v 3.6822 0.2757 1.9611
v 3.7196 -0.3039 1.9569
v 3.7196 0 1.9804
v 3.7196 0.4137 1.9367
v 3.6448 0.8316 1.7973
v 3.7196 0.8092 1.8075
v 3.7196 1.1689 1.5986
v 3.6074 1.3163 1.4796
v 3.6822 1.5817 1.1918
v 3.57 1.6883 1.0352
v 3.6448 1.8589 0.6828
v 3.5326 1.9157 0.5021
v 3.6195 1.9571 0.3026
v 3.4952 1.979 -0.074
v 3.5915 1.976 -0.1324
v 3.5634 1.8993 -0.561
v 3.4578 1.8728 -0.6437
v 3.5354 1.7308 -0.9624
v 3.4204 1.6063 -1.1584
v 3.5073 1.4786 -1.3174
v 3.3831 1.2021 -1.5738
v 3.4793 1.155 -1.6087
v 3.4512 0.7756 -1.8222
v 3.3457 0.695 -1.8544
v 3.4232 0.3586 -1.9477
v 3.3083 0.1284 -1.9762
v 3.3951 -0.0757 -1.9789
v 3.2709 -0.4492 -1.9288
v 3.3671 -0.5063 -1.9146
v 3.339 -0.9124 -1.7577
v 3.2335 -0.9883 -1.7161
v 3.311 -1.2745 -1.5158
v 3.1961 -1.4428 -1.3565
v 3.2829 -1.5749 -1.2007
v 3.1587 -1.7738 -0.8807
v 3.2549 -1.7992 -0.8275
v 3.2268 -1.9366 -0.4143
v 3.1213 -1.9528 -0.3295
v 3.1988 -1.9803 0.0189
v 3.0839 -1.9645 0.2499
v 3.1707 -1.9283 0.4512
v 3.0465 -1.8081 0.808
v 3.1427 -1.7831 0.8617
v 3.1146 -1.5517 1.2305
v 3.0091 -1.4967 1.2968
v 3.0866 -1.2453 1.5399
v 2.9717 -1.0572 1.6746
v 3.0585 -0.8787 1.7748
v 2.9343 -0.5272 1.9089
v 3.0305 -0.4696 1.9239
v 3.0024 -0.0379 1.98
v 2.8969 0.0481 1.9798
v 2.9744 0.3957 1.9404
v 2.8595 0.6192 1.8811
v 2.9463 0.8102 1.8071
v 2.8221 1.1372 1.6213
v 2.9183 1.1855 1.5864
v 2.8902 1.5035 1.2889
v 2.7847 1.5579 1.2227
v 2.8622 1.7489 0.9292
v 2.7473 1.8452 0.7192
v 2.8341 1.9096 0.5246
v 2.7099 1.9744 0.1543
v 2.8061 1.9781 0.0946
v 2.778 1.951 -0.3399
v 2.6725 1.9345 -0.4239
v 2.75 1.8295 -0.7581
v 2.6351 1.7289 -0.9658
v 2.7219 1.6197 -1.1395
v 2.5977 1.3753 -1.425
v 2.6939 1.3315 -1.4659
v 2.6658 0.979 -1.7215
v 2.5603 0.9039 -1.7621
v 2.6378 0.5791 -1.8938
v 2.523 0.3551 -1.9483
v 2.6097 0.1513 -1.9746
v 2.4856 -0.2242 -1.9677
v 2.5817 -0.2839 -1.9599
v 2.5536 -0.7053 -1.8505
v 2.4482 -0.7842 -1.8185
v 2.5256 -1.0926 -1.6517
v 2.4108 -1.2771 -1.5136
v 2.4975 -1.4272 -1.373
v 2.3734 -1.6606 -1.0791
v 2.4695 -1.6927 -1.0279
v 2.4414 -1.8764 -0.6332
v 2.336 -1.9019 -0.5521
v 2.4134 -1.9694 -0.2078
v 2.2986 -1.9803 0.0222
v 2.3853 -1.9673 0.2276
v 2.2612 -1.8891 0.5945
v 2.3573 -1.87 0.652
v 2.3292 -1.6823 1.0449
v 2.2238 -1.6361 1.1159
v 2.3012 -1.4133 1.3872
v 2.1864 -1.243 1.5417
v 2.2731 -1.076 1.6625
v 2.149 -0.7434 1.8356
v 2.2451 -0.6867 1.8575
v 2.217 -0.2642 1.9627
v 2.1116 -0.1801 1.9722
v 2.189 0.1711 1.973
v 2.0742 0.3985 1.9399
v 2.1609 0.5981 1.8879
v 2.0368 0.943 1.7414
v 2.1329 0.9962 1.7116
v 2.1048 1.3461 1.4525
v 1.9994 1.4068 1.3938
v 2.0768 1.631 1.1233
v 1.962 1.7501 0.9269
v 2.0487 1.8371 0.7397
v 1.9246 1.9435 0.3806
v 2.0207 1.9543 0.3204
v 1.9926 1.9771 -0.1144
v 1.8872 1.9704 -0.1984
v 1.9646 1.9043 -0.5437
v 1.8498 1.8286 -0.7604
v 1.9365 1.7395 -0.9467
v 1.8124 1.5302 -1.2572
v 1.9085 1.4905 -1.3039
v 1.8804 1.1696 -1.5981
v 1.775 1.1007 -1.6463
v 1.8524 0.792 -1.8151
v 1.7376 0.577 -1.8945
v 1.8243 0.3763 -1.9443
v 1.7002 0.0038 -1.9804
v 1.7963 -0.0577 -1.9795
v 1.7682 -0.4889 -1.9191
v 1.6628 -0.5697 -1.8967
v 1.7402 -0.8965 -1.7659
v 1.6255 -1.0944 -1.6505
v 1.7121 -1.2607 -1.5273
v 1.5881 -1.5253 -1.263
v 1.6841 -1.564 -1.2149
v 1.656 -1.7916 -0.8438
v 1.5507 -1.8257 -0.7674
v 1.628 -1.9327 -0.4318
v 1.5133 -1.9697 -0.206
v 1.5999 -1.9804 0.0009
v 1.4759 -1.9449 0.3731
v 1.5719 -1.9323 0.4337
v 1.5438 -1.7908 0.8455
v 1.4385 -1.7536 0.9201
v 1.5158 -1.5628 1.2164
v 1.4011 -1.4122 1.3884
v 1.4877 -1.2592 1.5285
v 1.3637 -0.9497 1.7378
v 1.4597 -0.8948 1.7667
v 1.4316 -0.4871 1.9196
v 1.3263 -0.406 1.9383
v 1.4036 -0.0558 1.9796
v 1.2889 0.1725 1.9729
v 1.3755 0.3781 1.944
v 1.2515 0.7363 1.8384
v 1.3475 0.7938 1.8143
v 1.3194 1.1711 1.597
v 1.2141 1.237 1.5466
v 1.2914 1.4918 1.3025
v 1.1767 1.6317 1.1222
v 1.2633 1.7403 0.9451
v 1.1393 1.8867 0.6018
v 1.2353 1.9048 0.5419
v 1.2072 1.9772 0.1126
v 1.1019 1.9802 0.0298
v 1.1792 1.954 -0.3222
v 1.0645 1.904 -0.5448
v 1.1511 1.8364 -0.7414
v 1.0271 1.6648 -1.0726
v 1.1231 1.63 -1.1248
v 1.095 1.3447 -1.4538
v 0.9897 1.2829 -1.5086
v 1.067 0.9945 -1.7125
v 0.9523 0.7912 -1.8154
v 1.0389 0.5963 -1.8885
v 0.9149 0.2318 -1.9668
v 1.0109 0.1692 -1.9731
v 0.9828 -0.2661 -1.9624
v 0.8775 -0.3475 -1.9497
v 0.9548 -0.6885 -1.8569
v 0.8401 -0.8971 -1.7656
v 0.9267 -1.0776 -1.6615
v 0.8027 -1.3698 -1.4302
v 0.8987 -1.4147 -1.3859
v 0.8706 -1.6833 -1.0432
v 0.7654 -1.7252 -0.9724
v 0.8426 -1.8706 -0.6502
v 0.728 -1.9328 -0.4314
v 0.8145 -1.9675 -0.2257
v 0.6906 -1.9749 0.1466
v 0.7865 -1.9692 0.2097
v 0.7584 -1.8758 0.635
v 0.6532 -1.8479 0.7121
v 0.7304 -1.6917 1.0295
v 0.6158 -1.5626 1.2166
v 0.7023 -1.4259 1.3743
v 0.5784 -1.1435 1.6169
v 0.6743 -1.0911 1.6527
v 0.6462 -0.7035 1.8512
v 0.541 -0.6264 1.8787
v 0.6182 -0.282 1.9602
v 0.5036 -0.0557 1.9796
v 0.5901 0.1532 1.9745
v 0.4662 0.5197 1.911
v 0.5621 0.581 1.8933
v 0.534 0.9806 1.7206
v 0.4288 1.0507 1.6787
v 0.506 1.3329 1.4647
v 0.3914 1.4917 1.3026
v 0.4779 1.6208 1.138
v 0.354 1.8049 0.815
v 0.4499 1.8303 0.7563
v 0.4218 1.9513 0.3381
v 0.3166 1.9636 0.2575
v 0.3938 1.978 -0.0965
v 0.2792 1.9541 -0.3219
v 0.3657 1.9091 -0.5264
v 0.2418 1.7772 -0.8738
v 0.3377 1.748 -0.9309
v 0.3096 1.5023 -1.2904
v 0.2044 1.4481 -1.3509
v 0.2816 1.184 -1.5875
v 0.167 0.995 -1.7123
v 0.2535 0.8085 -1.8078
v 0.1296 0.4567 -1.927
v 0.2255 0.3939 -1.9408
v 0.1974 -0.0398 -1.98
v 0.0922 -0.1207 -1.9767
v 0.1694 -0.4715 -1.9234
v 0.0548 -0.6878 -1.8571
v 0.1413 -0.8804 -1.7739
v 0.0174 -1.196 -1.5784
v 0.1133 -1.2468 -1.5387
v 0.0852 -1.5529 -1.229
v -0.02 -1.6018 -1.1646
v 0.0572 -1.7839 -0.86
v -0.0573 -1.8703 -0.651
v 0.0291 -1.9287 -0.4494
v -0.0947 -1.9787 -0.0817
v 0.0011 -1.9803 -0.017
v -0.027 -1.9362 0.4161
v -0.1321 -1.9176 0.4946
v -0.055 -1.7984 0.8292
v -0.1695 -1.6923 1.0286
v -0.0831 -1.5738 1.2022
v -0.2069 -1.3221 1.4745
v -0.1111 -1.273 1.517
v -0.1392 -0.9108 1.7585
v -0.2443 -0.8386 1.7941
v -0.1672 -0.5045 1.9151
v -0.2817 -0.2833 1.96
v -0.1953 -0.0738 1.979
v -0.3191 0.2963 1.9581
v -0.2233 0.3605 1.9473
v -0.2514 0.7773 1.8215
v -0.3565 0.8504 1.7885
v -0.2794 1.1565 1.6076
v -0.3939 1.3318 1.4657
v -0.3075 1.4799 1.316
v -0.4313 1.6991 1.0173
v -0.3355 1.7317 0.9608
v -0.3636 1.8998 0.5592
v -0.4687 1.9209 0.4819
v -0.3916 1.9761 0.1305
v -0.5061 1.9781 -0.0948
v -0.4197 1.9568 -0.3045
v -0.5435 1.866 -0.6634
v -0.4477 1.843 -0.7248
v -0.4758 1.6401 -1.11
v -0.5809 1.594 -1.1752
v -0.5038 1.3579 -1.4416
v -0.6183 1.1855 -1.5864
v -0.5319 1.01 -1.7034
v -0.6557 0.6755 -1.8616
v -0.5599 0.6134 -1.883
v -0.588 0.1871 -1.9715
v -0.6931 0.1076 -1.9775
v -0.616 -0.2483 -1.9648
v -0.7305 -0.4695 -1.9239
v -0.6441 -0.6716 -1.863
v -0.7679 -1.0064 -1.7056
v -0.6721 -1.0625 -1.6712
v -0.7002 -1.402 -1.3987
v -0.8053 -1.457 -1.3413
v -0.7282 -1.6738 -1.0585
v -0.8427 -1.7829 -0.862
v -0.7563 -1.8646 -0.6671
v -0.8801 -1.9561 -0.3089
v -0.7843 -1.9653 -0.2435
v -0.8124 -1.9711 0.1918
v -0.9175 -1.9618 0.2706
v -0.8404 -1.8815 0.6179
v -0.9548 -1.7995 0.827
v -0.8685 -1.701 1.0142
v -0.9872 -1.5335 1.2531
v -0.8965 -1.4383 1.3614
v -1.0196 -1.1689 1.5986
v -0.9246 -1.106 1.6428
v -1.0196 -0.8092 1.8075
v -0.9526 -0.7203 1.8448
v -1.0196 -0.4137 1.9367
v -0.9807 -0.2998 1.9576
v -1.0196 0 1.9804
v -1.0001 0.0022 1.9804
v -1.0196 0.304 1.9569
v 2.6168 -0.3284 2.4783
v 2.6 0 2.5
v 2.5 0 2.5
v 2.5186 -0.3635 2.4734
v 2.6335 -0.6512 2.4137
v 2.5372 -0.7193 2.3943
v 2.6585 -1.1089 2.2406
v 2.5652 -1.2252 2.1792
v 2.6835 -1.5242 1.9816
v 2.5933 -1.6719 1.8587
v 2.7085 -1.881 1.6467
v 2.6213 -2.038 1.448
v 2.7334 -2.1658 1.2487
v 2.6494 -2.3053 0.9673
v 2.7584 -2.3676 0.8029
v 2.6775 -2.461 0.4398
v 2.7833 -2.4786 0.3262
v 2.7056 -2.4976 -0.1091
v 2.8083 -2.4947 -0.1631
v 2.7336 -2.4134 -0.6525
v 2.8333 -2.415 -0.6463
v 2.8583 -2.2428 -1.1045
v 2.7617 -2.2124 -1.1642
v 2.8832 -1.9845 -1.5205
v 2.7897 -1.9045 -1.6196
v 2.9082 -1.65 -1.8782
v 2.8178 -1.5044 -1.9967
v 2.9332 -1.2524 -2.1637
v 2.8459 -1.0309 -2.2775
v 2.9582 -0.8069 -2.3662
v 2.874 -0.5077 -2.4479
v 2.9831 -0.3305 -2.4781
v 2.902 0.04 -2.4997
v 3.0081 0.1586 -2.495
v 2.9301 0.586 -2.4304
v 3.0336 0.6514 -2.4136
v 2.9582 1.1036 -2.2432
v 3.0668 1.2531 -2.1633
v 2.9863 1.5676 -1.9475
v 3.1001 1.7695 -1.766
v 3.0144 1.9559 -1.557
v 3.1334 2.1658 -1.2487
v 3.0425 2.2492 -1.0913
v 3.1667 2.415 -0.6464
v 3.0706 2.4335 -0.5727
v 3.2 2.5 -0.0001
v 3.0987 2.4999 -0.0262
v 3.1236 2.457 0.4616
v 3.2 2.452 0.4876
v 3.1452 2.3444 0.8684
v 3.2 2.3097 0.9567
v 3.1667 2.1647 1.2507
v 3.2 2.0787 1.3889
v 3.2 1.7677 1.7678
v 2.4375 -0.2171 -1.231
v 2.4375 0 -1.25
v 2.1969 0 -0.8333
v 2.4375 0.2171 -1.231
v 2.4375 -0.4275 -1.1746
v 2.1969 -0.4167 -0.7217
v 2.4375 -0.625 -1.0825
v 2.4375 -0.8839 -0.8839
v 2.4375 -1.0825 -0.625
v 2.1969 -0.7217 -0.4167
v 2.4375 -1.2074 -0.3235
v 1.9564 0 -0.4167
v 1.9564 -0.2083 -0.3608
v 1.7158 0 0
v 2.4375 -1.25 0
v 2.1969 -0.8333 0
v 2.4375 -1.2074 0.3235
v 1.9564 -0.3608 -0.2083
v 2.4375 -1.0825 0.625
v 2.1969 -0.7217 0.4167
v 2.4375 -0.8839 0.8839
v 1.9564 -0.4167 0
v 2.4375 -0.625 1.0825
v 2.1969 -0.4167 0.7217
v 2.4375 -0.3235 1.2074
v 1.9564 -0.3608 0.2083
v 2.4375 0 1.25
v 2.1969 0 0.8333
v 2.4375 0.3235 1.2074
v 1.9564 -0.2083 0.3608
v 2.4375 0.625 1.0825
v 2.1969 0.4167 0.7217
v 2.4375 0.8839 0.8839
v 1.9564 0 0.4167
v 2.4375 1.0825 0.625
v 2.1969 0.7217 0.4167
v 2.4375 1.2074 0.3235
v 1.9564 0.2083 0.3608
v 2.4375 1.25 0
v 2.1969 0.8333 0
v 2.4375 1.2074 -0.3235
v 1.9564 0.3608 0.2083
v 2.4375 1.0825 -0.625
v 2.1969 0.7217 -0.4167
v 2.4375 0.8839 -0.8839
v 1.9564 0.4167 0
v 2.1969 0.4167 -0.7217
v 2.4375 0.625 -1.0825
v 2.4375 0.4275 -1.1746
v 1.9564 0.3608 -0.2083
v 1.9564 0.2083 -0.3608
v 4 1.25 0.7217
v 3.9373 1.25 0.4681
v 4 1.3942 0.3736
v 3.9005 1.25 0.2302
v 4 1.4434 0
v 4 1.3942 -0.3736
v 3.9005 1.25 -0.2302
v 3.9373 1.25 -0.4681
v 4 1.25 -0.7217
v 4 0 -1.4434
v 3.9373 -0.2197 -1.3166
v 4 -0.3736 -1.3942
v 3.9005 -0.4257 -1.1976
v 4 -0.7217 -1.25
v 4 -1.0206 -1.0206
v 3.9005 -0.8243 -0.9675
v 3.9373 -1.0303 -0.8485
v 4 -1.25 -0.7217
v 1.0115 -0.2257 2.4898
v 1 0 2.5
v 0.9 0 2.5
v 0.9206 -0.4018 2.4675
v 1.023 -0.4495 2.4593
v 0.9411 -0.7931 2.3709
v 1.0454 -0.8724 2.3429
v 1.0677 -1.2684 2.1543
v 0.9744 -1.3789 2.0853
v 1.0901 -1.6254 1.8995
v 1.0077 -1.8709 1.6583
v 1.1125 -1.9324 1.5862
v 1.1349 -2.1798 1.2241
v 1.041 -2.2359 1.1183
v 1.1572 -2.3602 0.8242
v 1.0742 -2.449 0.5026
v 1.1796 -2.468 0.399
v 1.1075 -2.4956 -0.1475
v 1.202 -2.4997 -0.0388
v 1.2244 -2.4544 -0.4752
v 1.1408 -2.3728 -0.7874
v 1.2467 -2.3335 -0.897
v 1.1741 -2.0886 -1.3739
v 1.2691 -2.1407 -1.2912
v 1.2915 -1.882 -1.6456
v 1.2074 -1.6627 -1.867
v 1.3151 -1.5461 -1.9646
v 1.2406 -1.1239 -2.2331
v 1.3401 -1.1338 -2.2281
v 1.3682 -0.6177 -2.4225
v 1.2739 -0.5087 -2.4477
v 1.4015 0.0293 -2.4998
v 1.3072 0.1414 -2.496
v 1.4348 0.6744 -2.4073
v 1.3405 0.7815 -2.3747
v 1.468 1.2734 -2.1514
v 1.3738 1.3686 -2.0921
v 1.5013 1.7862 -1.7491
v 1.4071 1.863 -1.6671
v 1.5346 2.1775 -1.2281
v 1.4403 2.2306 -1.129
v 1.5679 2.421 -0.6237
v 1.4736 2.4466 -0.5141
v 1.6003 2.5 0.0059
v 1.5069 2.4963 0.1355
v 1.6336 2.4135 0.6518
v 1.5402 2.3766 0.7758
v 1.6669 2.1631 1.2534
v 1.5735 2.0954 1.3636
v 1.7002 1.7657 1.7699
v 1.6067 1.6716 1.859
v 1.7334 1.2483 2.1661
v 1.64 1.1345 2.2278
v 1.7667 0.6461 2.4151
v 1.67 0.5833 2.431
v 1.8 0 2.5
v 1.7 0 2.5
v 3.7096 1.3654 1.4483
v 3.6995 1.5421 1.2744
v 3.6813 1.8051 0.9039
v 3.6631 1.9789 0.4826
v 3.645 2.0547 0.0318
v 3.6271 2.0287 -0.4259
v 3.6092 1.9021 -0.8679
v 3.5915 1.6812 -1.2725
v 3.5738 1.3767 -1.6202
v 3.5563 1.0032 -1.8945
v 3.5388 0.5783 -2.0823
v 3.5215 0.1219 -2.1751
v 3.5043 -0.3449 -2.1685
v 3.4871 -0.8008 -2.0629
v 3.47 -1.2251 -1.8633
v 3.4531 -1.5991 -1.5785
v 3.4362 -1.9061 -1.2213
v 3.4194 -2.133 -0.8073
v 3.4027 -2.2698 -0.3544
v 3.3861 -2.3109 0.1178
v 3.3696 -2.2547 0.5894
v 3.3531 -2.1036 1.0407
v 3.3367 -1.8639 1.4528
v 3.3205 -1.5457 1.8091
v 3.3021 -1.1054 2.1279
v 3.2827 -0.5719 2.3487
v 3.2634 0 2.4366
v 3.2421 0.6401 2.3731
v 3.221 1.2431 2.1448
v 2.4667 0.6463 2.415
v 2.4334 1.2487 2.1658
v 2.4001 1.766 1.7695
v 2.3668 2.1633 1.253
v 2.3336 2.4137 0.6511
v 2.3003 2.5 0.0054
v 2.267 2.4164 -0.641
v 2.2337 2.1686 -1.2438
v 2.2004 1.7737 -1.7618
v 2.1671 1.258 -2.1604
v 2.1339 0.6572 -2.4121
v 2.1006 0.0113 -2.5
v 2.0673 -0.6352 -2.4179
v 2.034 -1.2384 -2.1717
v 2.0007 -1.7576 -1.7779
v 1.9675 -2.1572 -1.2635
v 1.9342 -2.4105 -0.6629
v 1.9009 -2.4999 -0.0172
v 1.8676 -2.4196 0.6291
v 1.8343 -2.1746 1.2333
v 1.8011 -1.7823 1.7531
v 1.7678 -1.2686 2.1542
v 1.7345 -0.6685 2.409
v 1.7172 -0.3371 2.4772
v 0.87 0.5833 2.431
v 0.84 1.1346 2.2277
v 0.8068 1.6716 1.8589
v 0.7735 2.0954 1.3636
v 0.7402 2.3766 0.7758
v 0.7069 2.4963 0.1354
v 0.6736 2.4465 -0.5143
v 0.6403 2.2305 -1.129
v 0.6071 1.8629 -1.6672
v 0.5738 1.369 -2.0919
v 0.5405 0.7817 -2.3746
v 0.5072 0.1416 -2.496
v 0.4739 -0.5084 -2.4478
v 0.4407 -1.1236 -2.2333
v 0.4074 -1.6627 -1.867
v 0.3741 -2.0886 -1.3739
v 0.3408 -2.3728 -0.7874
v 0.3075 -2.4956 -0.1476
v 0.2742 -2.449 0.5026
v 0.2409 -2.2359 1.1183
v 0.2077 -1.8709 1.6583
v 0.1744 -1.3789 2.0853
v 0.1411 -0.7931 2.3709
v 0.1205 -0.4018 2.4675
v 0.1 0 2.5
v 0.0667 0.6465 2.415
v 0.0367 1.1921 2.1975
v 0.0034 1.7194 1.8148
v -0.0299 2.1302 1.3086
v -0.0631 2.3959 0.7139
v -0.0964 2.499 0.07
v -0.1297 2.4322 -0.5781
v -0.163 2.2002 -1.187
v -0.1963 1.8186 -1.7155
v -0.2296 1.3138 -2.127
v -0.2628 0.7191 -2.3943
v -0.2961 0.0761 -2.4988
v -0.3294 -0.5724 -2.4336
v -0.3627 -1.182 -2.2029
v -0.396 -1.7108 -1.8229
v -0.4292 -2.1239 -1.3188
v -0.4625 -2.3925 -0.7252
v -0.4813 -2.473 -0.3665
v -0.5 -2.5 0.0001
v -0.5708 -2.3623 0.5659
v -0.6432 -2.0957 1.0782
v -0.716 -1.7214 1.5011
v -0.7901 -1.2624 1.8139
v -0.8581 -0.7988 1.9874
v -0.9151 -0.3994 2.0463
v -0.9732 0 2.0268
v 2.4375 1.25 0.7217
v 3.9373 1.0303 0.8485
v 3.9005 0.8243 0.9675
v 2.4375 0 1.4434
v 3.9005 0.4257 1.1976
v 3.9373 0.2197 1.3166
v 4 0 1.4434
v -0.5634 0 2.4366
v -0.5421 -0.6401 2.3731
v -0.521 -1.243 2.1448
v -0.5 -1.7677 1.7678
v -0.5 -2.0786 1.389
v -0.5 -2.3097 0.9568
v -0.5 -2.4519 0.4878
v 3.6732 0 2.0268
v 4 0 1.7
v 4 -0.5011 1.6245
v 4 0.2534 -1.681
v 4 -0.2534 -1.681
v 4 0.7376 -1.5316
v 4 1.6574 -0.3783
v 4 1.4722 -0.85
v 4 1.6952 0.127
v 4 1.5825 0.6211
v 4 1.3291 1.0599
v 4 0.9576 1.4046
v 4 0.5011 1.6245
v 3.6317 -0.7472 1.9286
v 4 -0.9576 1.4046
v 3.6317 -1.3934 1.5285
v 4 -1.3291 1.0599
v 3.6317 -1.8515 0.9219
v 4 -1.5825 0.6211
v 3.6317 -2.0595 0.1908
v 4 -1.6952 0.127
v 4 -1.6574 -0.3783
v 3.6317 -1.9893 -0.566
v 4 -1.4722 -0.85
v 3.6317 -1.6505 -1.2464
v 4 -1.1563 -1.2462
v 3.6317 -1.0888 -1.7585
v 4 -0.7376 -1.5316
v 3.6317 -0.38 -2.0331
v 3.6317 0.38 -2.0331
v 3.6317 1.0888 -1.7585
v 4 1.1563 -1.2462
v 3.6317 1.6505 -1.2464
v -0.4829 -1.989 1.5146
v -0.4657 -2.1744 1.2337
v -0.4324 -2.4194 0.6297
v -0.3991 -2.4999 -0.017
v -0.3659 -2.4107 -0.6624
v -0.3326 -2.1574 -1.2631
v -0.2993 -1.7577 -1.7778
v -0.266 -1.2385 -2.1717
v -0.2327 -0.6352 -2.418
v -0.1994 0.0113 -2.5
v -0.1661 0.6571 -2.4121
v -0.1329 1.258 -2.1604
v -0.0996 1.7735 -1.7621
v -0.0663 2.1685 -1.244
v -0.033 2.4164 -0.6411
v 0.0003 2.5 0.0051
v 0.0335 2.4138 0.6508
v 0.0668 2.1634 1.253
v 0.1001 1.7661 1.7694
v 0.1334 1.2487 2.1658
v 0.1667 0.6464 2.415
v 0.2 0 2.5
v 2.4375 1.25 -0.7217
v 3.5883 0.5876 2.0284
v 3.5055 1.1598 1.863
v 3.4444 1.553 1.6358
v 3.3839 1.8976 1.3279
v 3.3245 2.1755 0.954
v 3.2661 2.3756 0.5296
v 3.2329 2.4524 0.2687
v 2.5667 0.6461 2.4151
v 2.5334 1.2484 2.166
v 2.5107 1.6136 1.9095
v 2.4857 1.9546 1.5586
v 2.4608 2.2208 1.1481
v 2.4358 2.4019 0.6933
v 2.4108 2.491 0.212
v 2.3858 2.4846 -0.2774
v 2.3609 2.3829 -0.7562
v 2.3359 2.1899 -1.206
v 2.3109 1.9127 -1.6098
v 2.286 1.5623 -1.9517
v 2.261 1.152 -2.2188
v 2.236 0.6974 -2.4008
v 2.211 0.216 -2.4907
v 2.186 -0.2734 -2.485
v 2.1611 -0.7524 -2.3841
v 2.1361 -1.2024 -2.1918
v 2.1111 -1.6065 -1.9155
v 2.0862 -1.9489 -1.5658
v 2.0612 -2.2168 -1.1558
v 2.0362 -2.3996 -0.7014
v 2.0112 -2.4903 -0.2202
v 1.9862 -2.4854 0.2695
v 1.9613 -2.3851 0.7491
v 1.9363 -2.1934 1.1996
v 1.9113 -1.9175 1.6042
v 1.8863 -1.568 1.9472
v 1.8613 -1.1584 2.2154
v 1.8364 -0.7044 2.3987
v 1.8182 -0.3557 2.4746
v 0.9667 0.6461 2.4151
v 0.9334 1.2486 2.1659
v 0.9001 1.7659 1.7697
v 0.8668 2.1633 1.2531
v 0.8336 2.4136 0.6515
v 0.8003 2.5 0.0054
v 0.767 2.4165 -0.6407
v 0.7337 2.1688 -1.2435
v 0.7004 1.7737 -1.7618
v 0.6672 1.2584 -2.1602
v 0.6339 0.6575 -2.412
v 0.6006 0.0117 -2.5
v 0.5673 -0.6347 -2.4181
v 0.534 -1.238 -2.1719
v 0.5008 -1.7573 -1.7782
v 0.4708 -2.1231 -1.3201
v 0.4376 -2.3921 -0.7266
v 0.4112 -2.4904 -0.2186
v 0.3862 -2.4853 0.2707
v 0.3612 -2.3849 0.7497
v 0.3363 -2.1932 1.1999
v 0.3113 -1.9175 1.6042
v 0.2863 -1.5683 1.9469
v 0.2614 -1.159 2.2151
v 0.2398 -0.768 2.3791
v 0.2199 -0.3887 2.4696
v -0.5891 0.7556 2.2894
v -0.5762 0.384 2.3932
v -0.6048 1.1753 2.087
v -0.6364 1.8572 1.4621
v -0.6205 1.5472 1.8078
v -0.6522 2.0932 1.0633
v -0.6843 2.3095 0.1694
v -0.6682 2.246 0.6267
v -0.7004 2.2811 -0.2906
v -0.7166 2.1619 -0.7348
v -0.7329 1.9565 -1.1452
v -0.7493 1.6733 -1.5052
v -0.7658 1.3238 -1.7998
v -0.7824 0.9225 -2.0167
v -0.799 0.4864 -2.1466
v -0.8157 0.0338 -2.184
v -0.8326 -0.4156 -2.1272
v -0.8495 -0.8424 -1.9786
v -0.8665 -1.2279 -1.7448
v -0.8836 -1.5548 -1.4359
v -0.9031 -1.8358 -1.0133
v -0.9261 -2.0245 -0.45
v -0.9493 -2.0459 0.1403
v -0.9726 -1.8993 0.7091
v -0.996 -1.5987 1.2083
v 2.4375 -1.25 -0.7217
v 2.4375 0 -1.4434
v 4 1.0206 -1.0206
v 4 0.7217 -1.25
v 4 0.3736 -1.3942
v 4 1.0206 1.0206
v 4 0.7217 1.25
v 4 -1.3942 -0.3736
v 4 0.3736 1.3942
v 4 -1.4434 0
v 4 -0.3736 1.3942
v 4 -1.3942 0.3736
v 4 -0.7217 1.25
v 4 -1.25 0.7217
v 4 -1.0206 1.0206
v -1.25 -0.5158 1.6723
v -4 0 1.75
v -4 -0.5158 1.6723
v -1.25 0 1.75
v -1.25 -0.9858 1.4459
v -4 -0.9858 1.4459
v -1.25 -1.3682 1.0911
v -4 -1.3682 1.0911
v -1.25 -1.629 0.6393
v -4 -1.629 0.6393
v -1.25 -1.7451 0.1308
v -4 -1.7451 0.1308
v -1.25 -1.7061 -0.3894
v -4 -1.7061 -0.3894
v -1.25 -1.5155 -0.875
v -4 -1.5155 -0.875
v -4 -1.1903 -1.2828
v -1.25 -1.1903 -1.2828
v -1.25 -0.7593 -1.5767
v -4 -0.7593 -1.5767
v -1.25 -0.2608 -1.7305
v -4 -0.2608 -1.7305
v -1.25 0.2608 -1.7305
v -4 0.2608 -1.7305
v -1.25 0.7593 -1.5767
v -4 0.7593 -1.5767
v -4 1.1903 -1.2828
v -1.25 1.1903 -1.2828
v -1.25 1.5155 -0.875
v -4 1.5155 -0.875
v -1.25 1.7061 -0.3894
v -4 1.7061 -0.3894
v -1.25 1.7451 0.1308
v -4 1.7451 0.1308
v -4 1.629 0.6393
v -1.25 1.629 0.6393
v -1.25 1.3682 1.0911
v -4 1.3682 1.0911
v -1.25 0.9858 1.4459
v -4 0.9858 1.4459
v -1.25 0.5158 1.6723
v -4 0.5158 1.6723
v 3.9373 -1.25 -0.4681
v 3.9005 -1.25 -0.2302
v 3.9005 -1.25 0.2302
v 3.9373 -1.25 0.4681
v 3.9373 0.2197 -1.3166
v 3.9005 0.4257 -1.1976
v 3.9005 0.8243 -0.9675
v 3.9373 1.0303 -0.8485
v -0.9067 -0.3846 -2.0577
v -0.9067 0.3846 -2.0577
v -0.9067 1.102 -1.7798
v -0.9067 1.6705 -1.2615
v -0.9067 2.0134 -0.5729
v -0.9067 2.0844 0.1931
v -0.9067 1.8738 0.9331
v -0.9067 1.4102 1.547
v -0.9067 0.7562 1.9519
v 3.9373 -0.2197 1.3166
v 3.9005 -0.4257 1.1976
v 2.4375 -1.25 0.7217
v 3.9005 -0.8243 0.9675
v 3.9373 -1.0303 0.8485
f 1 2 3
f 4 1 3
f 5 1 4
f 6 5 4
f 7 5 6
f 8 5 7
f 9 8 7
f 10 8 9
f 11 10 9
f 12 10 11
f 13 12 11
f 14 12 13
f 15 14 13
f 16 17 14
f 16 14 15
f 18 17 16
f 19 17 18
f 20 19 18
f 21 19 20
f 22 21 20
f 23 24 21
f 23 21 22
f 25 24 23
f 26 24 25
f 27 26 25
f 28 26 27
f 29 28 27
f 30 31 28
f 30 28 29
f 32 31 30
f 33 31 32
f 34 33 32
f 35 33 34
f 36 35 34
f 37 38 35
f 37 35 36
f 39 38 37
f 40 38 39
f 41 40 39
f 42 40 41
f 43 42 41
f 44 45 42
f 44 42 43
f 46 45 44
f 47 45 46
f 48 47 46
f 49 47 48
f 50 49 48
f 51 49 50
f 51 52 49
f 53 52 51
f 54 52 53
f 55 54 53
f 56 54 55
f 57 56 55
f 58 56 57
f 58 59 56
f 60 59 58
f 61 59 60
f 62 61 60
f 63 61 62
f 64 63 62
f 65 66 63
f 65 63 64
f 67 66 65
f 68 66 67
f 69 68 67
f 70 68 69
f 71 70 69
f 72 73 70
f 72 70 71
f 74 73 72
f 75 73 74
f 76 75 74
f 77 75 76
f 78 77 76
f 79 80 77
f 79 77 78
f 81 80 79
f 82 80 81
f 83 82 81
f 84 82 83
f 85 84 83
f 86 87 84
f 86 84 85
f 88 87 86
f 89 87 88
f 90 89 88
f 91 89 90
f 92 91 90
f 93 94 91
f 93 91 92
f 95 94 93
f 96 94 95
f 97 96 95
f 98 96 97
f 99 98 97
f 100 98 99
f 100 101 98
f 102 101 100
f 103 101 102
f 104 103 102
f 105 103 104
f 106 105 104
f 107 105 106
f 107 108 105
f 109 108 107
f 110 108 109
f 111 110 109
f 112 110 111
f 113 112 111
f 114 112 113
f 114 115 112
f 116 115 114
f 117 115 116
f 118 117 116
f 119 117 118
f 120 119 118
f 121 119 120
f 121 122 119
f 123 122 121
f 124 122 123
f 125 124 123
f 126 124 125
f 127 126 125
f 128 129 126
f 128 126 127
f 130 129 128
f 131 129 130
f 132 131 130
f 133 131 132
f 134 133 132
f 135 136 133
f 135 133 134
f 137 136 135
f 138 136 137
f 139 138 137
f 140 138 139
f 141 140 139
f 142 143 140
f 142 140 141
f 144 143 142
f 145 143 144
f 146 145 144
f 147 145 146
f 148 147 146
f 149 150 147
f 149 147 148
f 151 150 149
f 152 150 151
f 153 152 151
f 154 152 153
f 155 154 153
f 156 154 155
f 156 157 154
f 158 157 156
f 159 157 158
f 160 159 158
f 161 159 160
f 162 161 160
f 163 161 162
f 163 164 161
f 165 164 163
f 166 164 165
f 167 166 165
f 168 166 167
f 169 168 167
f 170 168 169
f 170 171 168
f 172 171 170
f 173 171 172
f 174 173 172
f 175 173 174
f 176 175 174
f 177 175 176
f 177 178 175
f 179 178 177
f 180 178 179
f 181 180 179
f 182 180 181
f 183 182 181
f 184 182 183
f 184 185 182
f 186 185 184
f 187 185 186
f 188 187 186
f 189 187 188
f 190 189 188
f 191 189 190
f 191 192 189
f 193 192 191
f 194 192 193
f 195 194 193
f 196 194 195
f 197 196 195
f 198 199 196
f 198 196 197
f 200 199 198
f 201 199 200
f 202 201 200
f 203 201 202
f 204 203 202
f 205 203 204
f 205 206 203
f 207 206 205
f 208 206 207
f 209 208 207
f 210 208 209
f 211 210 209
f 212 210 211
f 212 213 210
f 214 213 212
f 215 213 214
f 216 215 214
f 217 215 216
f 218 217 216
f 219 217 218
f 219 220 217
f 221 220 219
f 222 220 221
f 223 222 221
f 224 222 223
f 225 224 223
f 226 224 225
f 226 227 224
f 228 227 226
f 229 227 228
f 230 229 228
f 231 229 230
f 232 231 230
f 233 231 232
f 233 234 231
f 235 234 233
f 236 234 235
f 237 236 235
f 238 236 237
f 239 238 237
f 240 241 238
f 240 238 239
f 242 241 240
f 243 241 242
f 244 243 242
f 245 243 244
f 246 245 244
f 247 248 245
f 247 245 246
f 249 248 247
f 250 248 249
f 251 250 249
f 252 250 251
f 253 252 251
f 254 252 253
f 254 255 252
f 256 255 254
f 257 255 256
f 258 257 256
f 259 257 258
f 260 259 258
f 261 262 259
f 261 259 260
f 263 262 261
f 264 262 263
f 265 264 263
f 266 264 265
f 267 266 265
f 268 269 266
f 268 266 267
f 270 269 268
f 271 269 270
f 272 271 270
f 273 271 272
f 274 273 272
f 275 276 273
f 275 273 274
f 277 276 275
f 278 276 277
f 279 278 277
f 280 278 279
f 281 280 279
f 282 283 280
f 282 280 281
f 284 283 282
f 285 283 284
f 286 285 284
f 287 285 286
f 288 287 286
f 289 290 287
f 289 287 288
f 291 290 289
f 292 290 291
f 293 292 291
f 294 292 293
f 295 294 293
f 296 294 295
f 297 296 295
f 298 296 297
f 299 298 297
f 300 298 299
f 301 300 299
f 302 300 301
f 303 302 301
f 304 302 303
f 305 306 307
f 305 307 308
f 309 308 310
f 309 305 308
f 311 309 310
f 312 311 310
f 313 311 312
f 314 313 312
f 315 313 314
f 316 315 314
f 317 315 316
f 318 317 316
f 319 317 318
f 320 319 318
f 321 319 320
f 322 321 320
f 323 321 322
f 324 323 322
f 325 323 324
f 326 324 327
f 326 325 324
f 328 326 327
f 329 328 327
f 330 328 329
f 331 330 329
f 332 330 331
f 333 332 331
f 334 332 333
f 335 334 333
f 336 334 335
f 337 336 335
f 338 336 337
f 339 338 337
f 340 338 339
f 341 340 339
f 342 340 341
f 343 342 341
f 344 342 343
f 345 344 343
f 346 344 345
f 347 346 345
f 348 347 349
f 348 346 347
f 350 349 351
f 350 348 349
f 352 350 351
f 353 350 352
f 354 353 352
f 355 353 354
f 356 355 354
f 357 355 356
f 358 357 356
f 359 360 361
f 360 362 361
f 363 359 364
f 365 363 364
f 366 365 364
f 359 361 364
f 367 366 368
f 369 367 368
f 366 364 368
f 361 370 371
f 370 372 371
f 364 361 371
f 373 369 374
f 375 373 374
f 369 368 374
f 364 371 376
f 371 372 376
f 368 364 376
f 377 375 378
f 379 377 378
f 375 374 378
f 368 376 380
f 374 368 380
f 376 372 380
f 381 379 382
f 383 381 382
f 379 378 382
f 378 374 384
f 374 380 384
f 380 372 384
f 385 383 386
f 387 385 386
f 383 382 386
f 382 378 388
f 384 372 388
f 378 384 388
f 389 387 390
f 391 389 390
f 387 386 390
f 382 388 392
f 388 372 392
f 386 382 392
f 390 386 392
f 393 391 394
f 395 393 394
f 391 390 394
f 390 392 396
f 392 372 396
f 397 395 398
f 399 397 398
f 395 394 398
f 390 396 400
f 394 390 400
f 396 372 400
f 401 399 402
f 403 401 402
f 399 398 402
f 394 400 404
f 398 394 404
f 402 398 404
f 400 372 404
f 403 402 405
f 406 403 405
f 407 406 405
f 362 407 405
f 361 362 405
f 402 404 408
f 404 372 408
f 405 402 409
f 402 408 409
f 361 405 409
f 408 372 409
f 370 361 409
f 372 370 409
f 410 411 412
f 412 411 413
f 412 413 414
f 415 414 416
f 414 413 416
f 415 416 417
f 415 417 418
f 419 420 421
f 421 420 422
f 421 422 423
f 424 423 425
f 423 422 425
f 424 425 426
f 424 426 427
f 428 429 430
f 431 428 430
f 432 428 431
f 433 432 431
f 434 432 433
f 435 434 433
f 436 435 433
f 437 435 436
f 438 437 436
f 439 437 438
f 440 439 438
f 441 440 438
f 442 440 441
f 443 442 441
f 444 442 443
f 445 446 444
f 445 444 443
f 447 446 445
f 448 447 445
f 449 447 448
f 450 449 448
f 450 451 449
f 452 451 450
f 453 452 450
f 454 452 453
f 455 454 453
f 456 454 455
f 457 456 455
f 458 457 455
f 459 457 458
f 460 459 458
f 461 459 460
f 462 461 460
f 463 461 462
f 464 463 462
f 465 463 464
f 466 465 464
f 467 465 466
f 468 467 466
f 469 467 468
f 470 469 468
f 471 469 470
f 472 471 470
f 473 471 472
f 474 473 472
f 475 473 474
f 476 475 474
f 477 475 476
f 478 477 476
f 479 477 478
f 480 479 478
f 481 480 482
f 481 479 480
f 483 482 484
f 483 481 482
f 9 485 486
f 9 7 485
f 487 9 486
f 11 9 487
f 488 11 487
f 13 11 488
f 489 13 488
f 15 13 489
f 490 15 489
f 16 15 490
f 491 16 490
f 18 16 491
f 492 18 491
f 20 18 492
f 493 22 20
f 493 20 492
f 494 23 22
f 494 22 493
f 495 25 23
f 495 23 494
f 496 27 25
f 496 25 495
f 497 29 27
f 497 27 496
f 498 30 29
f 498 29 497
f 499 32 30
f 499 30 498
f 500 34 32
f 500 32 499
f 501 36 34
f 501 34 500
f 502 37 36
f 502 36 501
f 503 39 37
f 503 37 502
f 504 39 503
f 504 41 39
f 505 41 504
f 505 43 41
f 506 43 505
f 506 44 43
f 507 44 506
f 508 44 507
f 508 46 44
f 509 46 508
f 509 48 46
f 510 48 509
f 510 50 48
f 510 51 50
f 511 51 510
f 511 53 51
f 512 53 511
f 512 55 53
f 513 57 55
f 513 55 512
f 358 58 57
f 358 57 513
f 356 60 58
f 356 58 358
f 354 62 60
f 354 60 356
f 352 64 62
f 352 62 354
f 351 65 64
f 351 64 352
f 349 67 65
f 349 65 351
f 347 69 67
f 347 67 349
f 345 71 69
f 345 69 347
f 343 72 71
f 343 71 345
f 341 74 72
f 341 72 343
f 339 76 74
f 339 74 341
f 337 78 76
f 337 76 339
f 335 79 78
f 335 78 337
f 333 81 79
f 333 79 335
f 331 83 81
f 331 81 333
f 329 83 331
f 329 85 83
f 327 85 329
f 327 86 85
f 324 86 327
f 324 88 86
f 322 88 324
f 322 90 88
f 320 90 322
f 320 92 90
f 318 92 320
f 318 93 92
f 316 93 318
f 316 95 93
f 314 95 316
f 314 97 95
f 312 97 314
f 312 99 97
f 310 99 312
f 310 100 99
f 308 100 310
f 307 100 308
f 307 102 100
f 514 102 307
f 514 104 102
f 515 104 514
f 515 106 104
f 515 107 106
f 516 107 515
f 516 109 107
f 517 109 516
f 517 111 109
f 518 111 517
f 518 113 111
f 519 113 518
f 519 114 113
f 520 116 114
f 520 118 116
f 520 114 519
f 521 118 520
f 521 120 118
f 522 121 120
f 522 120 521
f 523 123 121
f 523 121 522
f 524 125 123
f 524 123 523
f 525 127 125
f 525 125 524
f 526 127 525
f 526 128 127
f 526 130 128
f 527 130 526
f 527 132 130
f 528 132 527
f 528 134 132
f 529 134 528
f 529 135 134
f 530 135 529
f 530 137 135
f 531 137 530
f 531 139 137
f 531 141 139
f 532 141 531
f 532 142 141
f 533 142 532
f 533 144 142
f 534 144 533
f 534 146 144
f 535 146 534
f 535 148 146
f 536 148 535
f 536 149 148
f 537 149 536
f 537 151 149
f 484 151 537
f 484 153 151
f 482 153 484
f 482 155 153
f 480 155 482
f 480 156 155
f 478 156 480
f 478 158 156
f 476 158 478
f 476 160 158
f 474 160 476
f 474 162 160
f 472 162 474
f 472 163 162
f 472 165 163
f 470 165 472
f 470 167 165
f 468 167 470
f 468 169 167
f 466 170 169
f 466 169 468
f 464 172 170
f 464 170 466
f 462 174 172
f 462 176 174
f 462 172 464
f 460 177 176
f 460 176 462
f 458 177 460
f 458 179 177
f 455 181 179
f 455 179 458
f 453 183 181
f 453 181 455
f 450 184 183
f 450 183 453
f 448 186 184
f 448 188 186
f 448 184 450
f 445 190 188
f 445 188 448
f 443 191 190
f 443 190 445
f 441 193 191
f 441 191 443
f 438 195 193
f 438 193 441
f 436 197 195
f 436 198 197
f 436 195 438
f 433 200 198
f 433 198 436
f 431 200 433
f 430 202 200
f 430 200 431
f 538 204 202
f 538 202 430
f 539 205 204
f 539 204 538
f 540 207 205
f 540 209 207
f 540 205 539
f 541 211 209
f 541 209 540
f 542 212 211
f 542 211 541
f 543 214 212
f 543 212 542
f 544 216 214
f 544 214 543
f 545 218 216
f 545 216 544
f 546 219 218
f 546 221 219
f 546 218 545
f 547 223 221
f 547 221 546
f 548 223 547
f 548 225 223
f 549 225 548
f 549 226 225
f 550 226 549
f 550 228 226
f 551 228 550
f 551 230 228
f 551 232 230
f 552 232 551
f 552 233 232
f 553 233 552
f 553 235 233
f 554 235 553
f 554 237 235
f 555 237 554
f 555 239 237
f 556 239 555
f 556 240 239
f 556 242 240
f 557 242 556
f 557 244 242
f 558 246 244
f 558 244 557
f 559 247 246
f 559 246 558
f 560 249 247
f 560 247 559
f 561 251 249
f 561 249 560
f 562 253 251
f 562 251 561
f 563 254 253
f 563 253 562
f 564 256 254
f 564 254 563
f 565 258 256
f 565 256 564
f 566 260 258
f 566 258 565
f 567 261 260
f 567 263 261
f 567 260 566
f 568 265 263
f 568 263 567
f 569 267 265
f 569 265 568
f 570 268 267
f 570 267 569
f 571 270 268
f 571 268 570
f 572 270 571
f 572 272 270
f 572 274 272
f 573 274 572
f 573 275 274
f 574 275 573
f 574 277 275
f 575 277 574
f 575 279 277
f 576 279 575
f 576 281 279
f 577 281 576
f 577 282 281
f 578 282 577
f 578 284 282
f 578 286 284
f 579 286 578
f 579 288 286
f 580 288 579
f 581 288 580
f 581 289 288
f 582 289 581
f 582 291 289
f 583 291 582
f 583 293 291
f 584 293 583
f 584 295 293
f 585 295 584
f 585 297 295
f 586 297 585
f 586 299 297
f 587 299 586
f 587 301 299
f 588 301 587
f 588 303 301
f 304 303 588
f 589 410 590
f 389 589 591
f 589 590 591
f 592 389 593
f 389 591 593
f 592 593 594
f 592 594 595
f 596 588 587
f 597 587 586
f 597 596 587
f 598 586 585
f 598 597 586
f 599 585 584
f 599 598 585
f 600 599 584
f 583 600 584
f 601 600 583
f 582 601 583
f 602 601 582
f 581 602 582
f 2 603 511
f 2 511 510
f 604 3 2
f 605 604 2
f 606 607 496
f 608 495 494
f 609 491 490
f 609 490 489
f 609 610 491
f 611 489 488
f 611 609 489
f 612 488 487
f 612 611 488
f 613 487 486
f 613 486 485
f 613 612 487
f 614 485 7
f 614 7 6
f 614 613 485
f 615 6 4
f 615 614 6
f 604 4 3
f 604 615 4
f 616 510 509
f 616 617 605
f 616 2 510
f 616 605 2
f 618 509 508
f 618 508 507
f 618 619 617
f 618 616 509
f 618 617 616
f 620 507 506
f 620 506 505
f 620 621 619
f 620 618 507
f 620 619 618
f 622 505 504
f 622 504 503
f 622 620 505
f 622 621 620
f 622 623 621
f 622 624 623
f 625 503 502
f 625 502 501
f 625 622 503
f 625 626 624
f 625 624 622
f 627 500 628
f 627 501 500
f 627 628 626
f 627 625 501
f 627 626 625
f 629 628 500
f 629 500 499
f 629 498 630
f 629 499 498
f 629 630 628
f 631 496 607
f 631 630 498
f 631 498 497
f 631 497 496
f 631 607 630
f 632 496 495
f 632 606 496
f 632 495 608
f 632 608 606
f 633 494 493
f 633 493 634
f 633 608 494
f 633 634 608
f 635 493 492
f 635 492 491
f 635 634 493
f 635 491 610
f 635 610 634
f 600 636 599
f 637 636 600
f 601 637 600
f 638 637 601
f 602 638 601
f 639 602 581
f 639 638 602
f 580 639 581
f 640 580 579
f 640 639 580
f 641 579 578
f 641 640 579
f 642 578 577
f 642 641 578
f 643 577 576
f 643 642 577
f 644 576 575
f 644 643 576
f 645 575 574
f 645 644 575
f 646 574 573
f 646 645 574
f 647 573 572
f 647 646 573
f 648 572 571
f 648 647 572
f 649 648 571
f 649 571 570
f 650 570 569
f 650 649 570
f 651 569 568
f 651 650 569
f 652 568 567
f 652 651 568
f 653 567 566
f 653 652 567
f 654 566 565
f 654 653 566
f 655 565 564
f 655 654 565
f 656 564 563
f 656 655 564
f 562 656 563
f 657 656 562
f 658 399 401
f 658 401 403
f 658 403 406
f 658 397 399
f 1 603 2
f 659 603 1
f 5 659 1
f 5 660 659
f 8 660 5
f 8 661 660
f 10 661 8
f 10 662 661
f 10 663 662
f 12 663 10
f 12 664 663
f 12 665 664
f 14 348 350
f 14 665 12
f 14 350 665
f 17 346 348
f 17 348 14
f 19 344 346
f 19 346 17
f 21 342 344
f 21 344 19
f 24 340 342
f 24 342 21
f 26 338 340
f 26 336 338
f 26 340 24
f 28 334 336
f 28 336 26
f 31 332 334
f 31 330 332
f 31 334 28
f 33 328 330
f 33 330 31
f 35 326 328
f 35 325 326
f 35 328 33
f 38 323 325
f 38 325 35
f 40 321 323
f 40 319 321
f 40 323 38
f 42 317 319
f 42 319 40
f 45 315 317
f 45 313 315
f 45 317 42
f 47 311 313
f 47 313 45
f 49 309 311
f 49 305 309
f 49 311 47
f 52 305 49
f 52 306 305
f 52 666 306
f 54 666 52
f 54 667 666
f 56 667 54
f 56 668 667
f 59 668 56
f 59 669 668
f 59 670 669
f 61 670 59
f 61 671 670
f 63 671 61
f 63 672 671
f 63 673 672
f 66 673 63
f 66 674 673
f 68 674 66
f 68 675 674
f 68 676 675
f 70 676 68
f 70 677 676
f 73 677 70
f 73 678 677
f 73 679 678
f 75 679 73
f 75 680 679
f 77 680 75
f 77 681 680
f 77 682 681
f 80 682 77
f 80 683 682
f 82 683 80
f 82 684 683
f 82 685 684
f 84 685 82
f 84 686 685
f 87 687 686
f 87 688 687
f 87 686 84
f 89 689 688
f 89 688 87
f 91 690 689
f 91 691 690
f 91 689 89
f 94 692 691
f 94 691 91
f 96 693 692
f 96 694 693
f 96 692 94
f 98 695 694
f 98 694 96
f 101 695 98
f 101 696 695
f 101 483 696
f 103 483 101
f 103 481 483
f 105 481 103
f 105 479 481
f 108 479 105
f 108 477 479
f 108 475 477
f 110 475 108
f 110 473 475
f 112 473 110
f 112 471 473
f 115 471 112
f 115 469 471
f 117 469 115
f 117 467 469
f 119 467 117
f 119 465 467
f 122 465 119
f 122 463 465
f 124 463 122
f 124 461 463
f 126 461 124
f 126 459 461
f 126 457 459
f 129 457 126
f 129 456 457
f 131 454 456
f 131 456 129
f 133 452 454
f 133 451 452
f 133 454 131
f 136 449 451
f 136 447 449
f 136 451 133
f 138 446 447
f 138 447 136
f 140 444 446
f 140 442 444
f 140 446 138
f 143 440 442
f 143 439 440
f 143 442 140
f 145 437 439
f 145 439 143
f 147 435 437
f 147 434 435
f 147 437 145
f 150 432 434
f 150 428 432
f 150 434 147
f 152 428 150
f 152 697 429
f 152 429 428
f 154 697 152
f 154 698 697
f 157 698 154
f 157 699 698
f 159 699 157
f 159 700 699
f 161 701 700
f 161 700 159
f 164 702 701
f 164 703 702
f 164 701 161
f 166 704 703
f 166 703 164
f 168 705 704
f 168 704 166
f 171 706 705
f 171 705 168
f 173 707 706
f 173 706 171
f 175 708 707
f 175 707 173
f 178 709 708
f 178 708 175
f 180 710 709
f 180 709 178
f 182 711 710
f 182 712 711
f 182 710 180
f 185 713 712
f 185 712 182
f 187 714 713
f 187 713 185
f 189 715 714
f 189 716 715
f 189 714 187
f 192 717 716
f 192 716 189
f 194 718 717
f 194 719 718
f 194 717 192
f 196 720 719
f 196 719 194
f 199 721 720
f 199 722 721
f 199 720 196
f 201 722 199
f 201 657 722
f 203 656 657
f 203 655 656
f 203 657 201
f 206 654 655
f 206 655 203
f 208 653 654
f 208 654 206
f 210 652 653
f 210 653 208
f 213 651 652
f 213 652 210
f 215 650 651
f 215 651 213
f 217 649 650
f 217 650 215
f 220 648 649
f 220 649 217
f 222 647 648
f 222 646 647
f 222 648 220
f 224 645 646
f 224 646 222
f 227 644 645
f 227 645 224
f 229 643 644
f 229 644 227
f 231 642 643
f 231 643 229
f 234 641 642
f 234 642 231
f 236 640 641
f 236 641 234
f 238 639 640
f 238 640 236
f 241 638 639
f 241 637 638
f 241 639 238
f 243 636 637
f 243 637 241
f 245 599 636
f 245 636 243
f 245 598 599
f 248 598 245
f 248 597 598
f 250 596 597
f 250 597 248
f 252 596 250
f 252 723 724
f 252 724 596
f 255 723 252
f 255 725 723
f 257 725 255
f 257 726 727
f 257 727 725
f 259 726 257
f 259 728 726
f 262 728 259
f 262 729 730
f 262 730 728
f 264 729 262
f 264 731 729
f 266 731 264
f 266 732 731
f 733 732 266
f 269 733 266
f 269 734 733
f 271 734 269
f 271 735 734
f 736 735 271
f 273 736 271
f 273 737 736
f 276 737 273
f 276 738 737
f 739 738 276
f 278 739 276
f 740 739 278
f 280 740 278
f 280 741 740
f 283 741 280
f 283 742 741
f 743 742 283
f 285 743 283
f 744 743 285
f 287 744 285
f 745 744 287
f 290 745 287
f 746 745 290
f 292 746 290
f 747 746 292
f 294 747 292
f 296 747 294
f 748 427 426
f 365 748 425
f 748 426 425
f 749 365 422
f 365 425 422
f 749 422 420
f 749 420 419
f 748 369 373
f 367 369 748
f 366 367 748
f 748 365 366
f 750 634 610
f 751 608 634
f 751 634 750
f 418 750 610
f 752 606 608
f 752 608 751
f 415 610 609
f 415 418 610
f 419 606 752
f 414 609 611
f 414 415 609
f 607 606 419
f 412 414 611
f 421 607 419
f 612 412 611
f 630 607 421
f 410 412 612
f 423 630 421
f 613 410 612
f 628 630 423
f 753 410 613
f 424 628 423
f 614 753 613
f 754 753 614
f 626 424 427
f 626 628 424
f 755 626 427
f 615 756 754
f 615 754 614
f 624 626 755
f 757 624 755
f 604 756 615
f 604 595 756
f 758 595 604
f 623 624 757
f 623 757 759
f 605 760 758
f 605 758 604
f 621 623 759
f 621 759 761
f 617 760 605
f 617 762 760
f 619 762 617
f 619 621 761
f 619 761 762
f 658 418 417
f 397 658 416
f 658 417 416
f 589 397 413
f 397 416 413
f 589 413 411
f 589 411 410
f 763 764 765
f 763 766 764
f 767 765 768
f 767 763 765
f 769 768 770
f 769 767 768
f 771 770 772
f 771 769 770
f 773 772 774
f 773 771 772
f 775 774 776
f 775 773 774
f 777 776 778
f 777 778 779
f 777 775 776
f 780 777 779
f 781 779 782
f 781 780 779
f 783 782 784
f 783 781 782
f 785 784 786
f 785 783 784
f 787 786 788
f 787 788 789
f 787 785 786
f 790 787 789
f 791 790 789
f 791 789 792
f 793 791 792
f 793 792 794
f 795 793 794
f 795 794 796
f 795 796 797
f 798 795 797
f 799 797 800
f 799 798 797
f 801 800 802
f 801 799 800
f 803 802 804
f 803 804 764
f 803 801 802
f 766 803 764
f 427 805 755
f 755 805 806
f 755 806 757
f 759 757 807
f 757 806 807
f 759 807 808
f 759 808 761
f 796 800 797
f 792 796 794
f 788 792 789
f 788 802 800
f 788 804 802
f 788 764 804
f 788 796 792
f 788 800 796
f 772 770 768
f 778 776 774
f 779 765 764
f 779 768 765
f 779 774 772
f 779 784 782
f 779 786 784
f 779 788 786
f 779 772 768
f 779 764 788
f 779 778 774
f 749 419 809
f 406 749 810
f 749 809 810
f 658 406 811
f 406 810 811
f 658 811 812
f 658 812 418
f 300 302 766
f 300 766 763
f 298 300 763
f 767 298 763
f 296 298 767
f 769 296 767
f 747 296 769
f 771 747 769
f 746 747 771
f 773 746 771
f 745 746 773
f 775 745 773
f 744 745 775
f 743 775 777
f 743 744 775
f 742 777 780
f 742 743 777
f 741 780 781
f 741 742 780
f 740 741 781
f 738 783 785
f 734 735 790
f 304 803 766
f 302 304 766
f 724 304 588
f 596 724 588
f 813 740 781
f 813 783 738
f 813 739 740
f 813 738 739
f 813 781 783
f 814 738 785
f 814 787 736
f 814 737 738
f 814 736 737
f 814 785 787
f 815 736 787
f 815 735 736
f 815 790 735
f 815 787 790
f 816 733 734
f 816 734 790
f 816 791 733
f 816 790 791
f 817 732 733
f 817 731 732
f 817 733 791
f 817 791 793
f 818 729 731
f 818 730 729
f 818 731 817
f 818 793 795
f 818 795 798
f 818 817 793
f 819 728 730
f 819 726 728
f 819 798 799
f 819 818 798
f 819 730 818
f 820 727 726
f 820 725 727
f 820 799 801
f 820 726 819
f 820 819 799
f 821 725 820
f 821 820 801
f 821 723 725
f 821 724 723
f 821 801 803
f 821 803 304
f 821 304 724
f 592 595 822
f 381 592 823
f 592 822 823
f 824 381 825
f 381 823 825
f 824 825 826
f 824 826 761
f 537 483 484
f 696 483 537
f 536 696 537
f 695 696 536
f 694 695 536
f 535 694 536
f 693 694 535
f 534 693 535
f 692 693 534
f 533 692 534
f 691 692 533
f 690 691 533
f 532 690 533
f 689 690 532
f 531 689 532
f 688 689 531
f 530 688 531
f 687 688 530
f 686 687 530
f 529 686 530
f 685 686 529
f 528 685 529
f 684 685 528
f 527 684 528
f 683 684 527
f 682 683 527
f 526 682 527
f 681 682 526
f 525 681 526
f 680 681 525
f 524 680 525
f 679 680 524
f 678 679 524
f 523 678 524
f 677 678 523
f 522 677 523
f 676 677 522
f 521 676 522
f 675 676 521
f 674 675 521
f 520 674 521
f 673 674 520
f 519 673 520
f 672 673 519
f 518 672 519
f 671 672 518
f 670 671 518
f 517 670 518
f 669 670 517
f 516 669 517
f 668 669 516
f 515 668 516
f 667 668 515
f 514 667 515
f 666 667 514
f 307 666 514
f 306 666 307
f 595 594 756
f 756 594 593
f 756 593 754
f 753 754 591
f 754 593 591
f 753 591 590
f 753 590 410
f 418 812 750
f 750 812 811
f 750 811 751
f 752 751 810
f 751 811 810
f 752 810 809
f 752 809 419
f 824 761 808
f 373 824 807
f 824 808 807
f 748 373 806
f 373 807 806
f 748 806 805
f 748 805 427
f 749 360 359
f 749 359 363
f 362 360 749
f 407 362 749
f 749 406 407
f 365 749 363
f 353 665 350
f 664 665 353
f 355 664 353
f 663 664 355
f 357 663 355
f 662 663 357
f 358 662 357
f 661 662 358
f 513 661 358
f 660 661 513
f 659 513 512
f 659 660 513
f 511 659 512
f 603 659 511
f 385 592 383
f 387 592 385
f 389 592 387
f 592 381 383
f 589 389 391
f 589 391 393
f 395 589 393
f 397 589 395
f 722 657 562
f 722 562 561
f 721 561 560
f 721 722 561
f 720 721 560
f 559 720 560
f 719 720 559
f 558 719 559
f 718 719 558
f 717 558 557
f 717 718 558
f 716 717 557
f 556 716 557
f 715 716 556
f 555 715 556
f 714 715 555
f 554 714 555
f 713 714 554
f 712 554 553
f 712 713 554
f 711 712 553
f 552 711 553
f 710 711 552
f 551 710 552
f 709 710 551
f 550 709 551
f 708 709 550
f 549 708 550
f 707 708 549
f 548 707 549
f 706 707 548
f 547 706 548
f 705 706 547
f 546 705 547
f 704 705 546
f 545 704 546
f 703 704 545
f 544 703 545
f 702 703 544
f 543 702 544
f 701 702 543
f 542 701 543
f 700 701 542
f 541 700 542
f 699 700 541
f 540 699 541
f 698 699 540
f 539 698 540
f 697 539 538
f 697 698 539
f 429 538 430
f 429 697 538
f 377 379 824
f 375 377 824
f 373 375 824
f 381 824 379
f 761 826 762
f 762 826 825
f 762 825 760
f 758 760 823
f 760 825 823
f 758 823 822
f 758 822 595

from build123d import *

# Parameters (mm, degrees)
CUT_EXTRUDE1_DEPTH     = 1.5625
CUT_SWEEP1_PITCH       = 0.8
CUT_SWEEP1_HEIGHT      = 6.05
CUT_SWEEP1_RADIUS      = 2.5
CUT_SWEEP1_START_ANGLE = -90


with BuildPart() as part:
    # Sketch2 → Revolve1 (revolve)
    with BuildSketch(Plane.XY, mode=Mode.PRIVATE) as revolve1_sk:
        Polygon((-4, 0), (-4, 1.75), (-1.25, 1.75), (-0.5, 2.5), (3.2, 2.5), (4, 1.7), (4, 0), align=None)
    revolve(revolve1_sk.sketch.rotate(Axis((-4, 0, 0), (1, 0, 0)), 90), axis=Axis((-4, 0, 0), (1, 0, 0)))

    # Sketch3 → Cut-Extrude1 (cut)
    with BuildSketch(Plane(origin=(4, 0, 0), x_dir=(0, 0, -1), z_dir=(1, 0, 0))):
        Polygon((0.721687836, 1.25), (-0.721687836, 1.25), (-1.443375673, 0), (-0.721687836, -1.25), (0.721687836, -1.25), (1.443375673, 0), align=None)
    extrude(amount=-CUT_EXTRUDE1_DEPTH, mode=Mode.SUBTRACT)

    # Cut-Extrude2 cone 1 section (through the dimple's axis) → Cut-Extrude2 (revolve, cut)
    with BuildSketch(Plane(origin=(4, 0, 0), x_dir=(0, 0, -1), z_dir=(0, 1, 0))):
        Polygon((0, 0), (1.443375673, 0), (0, 0.833333333), align=None)
    revolve(axis=Axis((4, 0, 0), (-1, 0, 0)), mode=Mode.SUBTRACT)

    # Cut-Extrude3 cone 1 section (through the dimple's axis) → Cut-Extrude3 (revolve, cut)
    with BuildSketch(Plane(origin=(2.4375, 0, 0), x_dir=(0, 0, -1), z_dir=(0, 1, 0))):
        Polygon((0, 0), (1.25, 0), (0, 0.721687836), align=None)
    revolve(axis=Axis((2.4375, 0, 0), (-1, 0, 0)), mode=Mode.SUBTRACT)

    # Cut-Sweep1: sweep along a helix
    with BuildLine() as cut_sweep1_path:
        add(Helix(CUT_SWEEP1_PITCH, CUT_SWEEP1_HEIGHT, CUT_SWEEP1_RADIUS, center=(4, 0, 0), direction=(-1, 0, 0), mode=Mode.PRIVATE).rotate(Axis((4, 0, 0), (-1, 0, 0)), CUT_SWEEP1_START_ANGLE))
    # Sketch6 → Cut-Sweep1 (sweep, cut)
    with BuildSketch(Plane.XY):
        Polygon((3.975, 2.54330127), (4.725, 2.54330127), (4.4, 1.980384758), (4.3, 1.980384758), align=None)
    sweep(path=cut_sweep1_path.line, is_frenet=True, mode=Mode.SUBTRACT)


solid = part.part
